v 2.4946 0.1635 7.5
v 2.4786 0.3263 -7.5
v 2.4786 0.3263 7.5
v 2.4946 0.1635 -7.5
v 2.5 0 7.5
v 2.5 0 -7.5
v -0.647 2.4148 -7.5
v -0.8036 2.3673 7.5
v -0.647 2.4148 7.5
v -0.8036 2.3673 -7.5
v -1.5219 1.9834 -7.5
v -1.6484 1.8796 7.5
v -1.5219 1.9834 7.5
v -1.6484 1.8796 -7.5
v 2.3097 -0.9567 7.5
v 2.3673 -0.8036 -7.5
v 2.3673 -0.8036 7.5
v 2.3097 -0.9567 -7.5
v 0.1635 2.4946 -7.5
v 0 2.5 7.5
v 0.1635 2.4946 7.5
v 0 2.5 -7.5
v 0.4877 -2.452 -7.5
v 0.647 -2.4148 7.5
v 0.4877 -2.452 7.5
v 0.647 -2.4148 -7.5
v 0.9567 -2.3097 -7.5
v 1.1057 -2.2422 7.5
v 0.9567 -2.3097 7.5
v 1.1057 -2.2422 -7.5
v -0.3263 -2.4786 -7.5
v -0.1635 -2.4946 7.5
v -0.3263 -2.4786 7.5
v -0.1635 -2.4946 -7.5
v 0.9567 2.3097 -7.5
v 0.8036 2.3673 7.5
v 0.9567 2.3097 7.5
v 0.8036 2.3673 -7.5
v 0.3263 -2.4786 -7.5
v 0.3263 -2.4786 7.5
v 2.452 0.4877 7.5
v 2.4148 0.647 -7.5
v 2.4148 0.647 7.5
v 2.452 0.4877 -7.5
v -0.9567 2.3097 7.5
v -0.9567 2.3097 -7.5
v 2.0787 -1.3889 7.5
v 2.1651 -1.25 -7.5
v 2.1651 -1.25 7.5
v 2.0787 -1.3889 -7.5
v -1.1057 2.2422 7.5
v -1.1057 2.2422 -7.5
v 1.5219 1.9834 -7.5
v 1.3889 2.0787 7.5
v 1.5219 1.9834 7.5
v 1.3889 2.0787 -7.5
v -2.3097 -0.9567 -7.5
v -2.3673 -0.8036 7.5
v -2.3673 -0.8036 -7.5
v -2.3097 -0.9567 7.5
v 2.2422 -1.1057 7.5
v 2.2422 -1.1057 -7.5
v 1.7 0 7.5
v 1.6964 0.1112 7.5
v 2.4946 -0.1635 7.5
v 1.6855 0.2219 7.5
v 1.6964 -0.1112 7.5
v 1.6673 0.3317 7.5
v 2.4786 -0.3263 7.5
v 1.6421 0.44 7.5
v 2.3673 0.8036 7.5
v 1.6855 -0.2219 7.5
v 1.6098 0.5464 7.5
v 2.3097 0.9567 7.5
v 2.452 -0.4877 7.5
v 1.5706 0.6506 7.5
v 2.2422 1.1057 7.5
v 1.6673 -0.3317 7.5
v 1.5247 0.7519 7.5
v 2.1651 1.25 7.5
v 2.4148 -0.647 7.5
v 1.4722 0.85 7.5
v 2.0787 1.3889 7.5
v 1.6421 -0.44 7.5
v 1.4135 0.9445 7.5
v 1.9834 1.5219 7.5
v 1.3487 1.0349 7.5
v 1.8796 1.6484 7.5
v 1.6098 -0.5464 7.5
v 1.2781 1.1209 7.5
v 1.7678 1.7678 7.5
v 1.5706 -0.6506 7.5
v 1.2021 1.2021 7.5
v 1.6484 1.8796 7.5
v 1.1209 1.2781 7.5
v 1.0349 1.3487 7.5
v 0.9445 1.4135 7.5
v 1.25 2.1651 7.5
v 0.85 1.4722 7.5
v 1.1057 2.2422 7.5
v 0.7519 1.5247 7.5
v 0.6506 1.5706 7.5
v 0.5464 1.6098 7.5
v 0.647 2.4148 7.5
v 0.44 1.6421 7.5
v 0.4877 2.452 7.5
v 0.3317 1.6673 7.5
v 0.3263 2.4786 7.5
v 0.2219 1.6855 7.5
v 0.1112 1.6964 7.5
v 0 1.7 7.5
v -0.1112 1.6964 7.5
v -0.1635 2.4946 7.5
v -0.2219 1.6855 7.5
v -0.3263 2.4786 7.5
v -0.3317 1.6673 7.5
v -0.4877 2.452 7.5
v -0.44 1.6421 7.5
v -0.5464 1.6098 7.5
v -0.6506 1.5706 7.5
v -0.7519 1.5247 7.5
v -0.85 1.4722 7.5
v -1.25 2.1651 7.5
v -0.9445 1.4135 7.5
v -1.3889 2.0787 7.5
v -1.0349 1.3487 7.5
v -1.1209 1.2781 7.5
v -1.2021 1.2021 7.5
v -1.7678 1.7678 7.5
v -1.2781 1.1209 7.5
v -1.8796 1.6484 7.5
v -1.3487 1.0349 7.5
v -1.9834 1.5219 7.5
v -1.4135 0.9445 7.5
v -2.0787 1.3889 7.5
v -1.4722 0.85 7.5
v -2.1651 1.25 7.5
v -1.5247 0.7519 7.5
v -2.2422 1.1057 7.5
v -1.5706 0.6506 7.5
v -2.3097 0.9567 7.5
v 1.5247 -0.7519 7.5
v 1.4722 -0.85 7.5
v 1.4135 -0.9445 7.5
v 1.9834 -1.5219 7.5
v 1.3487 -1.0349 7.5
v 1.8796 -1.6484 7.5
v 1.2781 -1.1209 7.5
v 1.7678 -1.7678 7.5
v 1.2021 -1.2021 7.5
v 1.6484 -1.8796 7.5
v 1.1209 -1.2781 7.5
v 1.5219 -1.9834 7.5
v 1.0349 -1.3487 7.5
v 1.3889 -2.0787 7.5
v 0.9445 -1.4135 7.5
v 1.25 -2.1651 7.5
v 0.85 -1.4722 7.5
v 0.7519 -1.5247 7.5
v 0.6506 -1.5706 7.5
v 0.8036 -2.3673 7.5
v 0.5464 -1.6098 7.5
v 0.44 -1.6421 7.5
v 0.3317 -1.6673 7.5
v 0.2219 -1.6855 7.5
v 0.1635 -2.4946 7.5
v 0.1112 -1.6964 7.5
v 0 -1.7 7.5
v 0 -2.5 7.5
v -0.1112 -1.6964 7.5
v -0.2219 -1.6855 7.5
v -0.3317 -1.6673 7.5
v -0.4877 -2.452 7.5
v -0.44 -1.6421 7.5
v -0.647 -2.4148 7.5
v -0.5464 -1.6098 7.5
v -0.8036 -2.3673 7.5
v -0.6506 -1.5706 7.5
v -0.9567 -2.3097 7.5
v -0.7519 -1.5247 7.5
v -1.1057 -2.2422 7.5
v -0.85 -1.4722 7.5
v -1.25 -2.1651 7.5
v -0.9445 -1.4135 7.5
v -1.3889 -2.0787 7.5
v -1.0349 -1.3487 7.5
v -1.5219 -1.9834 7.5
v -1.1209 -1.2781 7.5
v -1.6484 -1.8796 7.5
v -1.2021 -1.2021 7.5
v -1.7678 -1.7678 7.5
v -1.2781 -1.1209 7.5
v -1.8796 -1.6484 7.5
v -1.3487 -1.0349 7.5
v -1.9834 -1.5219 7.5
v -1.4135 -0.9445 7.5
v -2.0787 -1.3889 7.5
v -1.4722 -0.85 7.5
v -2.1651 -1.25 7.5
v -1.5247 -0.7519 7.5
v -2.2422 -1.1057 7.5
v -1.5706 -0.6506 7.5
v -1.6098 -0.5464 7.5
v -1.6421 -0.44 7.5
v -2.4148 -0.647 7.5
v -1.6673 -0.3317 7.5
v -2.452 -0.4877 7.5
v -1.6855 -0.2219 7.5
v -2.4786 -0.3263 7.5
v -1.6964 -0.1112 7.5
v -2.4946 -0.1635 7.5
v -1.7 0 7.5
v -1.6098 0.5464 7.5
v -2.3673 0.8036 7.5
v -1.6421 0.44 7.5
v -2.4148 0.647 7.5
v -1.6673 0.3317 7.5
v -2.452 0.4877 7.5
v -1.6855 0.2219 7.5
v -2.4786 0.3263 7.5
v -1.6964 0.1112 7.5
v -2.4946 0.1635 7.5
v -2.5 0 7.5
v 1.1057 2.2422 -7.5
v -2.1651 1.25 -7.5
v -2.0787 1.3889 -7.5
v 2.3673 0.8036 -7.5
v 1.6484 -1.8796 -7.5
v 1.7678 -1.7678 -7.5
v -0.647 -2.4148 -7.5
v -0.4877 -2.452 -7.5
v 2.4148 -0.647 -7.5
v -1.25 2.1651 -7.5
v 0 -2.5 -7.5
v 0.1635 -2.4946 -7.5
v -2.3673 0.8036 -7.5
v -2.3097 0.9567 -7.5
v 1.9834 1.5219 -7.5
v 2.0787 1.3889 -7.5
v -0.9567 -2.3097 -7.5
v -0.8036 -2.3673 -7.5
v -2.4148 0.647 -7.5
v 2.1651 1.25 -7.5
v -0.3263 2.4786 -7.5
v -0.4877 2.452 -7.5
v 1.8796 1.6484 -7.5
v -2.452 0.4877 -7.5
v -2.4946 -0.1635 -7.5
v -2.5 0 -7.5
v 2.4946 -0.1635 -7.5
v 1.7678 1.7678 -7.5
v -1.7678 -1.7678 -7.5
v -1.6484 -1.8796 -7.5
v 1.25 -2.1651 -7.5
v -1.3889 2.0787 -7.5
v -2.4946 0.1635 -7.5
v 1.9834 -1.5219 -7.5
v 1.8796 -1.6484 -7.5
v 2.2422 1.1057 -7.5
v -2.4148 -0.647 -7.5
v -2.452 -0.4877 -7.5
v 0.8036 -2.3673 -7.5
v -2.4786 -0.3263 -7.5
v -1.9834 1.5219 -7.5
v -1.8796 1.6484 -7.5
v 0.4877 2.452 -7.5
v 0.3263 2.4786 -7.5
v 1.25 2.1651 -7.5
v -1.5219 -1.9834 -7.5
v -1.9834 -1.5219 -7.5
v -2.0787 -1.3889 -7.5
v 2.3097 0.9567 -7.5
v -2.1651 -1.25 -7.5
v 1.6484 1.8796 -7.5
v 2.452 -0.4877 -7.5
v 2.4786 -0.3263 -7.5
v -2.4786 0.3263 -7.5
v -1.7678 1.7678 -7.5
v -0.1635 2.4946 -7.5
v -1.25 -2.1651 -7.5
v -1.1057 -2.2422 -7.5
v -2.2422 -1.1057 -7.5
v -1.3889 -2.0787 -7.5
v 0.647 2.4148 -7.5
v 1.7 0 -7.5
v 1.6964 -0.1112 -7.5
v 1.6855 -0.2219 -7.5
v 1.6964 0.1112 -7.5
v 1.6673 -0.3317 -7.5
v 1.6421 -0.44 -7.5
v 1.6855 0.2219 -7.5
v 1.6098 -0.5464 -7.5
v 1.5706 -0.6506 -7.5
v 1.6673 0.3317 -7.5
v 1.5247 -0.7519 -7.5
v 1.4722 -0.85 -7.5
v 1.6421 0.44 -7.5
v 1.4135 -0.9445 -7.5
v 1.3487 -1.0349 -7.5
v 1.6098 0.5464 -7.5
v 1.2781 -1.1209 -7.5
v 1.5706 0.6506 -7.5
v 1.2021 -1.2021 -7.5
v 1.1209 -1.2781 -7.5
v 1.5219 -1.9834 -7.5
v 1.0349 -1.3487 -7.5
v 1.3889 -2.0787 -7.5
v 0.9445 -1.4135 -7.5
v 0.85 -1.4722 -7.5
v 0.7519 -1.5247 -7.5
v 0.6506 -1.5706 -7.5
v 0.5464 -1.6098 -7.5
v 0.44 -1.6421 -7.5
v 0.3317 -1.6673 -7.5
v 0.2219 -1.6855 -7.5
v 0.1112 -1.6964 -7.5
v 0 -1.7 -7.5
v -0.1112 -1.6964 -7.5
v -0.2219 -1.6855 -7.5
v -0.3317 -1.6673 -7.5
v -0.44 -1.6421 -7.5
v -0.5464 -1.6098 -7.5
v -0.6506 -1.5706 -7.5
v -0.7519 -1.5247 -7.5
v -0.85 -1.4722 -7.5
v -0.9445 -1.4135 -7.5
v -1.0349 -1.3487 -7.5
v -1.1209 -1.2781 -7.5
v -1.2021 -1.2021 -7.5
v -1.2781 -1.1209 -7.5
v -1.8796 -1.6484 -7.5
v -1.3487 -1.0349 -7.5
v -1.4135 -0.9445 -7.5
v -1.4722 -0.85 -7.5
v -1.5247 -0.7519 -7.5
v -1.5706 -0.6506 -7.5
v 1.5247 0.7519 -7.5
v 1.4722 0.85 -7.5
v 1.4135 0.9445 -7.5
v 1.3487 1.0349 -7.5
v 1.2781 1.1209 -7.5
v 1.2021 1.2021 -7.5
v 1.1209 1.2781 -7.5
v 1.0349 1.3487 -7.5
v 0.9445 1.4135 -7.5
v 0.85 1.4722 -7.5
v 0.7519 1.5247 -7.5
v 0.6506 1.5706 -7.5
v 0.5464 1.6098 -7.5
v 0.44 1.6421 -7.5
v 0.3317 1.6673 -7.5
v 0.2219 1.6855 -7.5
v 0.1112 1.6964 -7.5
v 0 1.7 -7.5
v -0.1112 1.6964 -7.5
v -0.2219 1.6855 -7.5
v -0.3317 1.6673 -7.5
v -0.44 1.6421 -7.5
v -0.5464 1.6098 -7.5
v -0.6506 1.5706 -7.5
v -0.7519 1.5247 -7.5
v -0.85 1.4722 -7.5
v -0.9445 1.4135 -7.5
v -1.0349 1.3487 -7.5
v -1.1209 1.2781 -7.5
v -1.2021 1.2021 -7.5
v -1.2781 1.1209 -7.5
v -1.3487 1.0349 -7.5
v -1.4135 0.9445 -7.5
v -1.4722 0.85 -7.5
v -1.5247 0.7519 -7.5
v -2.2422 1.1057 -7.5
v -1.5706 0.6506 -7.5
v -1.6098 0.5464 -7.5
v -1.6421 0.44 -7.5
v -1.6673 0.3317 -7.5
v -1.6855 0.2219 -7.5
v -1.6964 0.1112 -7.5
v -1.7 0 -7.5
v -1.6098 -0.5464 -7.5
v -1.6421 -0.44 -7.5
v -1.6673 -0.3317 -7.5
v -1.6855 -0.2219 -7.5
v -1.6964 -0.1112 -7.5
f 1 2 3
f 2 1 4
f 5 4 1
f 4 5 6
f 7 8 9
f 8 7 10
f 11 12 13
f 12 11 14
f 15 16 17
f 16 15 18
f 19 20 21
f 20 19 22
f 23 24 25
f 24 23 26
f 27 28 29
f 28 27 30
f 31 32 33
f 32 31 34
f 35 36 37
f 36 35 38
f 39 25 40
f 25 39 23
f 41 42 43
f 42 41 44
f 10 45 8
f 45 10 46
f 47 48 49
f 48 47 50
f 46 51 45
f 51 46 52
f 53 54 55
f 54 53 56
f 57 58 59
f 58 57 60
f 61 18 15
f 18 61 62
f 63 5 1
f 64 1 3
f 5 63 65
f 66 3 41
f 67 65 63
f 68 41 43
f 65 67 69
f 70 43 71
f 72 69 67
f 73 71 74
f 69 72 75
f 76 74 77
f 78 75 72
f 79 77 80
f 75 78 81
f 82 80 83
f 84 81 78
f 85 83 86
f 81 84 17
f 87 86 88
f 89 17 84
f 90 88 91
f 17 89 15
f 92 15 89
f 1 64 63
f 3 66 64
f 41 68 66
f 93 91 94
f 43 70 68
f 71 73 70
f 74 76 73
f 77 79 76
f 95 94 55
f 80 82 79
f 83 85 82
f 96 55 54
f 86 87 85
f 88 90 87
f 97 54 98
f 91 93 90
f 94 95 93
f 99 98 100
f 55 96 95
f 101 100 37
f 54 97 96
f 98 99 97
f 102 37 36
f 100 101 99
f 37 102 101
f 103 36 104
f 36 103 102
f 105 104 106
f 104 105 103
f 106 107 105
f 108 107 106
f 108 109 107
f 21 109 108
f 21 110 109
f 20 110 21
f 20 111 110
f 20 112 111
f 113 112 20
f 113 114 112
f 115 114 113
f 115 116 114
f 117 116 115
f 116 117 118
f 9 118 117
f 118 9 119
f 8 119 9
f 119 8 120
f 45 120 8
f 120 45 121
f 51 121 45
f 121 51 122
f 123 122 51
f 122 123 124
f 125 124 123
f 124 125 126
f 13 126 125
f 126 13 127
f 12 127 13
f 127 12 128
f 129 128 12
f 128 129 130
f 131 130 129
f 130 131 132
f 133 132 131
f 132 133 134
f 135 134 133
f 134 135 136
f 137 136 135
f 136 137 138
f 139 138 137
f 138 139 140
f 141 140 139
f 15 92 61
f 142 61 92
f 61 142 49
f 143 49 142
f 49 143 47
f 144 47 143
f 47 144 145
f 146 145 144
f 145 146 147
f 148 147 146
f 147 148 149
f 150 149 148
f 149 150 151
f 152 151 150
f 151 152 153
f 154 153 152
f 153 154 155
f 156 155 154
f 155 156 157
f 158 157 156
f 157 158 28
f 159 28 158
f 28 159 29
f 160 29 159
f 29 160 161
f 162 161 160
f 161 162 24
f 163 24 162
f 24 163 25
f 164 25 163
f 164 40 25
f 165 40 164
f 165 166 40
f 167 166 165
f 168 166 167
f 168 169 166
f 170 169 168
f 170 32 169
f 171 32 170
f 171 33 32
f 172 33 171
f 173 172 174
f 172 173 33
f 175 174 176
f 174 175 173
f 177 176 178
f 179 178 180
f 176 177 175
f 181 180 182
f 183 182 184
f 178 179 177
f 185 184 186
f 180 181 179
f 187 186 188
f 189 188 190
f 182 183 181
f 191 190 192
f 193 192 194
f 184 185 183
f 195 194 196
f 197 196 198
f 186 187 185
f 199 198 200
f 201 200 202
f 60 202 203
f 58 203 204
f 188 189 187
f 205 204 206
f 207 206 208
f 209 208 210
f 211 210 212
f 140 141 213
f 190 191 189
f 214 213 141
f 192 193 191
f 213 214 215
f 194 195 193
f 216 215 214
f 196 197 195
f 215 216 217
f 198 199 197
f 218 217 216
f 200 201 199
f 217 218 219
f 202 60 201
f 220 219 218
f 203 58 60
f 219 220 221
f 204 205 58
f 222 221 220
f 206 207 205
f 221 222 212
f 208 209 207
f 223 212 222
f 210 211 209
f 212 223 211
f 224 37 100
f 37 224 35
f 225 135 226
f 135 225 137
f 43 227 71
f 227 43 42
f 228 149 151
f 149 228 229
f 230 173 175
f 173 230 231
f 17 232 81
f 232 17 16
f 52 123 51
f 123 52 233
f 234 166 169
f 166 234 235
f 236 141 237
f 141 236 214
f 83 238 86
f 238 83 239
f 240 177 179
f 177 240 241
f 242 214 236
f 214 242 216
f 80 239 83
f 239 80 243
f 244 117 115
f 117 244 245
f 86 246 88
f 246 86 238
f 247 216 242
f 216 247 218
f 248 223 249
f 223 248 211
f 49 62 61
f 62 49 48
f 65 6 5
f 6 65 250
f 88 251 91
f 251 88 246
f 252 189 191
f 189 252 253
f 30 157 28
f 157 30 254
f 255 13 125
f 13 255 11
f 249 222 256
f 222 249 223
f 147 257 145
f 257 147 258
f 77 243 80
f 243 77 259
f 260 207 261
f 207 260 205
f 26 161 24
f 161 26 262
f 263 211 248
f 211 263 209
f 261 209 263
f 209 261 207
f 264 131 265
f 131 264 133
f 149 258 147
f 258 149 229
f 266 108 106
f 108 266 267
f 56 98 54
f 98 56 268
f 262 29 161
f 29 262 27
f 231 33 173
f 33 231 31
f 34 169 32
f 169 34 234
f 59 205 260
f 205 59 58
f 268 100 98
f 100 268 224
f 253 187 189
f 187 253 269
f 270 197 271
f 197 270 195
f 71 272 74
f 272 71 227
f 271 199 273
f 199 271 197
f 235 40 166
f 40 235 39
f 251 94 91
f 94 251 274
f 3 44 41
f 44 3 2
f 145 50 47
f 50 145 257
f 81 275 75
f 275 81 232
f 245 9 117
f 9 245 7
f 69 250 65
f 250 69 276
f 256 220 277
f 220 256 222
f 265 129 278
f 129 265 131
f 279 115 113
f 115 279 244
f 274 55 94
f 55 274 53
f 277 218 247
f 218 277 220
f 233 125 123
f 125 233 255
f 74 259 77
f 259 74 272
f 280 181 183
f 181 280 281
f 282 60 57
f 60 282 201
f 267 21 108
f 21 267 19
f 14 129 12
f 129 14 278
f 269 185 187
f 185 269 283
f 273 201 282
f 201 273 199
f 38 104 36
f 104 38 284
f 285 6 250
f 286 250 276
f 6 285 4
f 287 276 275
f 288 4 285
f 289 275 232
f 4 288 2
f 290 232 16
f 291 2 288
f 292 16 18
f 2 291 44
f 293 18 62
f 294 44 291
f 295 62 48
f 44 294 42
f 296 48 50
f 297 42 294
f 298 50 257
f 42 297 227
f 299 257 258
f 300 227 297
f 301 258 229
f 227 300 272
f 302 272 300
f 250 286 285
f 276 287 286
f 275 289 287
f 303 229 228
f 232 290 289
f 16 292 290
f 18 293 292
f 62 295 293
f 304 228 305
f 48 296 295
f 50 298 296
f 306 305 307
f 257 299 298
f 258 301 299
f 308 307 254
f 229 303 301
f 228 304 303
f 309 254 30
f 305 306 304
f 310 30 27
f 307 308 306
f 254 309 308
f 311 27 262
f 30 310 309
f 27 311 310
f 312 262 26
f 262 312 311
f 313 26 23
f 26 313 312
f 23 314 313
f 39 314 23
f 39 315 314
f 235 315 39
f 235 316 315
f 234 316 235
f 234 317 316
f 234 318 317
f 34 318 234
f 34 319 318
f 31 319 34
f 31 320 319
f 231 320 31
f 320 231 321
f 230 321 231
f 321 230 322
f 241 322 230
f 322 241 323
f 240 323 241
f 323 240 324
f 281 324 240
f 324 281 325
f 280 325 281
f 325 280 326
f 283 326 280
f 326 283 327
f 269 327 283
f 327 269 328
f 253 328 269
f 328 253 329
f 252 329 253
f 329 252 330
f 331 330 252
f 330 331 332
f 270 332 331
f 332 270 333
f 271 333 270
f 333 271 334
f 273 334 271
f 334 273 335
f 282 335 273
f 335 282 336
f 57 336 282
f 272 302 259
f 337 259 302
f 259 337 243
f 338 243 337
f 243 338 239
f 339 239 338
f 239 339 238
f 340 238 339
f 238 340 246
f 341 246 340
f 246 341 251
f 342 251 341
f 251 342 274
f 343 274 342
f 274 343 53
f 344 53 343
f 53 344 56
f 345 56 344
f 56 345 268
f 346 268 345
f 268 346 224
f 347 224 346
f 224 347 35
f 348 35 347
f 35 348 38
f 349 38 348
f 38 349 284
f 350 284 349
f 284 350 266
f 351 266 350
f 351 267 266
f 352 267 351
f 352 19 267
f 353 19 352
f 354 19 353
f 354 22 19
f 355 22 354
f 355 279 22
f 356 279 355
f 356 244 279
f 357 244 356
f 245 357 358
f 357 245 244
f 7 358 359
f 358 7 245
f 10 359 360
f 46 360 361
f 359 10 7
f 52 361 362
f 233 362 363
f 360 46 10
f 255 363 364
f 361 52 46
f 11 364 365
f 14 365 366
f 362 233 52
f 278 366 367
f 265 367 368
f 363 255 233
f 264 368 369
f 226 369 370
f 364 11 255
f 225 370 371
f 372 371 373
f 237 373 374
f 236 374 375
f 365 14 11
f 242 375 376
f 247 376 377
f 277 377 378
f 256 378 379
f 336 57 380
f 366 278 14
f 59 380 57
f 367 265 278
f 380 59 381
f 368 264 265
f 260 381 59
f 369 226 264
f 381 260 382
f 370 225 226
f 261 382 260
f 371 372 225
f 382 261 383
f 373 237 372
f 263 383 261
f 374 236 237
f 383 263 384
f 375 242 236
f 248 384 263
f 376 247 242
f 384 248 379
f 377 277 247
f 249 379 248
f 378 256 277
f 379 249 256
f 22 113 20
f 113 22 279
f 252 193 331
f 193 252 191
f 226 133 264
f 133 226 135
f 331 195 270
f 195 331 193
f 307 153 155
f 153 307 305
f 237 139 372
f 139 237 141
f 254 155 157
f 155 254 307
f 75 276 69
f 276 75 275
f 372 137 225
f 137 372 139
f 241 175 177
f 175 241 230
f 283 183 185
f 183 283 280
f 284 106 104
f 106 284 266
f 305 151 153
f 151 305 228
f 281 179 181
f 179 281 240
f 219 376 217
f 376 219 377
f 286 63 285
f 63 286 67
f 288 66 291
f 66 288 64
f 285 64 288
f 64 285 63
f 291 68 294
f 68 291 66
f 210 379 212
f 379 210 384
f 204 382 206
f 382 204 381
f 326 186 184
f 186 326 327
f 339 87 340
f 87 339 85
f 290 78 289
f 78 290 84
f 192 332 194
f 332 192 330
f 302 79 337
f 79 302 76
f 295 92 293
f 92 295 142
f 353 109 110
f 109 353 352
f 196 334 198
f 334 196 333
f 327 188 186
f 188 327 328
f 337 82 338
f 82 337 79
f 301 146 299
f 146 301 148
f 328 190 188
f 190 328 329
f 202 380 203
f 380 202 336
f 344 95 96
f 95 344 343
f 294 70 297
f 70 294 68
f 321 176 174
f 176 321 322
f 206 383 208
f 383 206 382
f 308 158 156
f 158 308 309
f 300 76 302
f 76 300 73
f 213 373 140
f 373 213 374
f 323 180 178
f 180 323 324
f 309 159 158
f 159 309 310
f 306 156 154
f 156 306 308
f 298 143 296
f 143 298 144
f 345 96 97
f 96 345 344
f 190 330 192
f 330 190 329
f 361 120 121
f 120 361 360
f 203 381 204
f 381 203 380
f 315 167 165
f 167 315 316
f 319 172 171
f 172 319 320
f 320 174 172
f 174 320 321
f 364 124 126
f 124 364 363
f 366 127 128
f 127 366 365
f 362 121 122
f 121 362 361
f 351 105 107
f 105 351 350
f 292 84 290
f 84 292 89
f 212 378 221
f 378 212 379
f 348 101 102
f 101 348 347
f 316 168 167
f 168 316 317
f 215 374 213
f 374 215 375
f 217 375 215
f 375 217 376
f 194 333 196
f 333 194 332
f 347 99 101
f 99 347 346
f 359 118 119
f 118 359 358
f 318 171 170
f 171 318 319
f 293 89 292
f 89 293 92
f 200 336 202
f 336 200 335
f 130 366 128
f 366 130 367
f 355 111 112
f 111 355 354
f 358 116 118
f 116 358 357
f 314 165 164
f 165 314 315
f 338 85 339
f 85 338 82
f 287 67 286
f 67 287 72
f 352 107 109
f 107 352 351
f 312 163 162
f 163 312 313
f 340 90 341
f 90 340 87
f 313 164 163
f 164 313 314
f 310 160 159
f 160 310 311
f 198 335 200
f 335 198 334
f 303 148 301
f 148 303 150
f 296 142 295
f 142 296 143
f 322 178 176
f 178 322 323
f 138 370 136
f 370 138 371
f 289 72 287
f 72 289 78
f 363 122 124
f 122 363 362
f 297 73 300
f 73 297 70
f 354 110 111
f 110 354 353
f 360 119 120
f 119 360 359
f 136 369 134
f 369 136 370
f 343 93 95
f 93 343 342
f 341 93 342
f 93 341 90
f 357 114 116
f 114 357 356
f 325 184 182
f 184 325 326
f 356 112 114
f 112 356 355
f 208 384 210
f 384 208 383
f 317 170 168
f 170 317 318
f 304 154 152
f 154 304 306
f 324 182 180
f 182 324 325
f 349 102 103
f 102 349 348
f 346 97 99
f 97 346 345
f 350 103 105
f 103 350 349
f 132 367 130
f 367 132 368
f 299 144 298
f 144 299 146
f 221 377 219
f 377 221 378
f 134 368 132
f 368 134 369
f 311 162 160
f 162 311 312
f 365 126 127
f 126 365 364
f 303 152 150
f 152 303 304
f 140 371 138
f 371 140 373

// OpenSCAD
// Heatshrink sleeving / tubing (single connected solid)

// Parameters (kept from original where relevant)
length = 15; //[8:30:1]
center = true; //[0:1:1]

id = 3; //[1.5:6:0.5]
od = 5; //[2.5:10:0.5]
wall_min = 0.6; //[0.3:1.5:0.1]
bore_clearance = 0.2; //[0:0.6:0.1]
overlap = 1; //[0.5:2:0.1]

// Smoothness
$fn = 96;

// Derived dimensions
outer_r = max(od/2, id/2 + wall_min);
inner_r = id/2 + bore_clearance;

// One connected solid: a hollow tube (heatshrink)
module heatshrink_tube() {
  color([0.85, 0.85, 0.8])
  difference() {
    cylinder(h=length, r=outer_r, center=center);
    cylinder(h=length + 2*overlap, r=inner_r, center=center);
  }
}

heatshrink_tube();
